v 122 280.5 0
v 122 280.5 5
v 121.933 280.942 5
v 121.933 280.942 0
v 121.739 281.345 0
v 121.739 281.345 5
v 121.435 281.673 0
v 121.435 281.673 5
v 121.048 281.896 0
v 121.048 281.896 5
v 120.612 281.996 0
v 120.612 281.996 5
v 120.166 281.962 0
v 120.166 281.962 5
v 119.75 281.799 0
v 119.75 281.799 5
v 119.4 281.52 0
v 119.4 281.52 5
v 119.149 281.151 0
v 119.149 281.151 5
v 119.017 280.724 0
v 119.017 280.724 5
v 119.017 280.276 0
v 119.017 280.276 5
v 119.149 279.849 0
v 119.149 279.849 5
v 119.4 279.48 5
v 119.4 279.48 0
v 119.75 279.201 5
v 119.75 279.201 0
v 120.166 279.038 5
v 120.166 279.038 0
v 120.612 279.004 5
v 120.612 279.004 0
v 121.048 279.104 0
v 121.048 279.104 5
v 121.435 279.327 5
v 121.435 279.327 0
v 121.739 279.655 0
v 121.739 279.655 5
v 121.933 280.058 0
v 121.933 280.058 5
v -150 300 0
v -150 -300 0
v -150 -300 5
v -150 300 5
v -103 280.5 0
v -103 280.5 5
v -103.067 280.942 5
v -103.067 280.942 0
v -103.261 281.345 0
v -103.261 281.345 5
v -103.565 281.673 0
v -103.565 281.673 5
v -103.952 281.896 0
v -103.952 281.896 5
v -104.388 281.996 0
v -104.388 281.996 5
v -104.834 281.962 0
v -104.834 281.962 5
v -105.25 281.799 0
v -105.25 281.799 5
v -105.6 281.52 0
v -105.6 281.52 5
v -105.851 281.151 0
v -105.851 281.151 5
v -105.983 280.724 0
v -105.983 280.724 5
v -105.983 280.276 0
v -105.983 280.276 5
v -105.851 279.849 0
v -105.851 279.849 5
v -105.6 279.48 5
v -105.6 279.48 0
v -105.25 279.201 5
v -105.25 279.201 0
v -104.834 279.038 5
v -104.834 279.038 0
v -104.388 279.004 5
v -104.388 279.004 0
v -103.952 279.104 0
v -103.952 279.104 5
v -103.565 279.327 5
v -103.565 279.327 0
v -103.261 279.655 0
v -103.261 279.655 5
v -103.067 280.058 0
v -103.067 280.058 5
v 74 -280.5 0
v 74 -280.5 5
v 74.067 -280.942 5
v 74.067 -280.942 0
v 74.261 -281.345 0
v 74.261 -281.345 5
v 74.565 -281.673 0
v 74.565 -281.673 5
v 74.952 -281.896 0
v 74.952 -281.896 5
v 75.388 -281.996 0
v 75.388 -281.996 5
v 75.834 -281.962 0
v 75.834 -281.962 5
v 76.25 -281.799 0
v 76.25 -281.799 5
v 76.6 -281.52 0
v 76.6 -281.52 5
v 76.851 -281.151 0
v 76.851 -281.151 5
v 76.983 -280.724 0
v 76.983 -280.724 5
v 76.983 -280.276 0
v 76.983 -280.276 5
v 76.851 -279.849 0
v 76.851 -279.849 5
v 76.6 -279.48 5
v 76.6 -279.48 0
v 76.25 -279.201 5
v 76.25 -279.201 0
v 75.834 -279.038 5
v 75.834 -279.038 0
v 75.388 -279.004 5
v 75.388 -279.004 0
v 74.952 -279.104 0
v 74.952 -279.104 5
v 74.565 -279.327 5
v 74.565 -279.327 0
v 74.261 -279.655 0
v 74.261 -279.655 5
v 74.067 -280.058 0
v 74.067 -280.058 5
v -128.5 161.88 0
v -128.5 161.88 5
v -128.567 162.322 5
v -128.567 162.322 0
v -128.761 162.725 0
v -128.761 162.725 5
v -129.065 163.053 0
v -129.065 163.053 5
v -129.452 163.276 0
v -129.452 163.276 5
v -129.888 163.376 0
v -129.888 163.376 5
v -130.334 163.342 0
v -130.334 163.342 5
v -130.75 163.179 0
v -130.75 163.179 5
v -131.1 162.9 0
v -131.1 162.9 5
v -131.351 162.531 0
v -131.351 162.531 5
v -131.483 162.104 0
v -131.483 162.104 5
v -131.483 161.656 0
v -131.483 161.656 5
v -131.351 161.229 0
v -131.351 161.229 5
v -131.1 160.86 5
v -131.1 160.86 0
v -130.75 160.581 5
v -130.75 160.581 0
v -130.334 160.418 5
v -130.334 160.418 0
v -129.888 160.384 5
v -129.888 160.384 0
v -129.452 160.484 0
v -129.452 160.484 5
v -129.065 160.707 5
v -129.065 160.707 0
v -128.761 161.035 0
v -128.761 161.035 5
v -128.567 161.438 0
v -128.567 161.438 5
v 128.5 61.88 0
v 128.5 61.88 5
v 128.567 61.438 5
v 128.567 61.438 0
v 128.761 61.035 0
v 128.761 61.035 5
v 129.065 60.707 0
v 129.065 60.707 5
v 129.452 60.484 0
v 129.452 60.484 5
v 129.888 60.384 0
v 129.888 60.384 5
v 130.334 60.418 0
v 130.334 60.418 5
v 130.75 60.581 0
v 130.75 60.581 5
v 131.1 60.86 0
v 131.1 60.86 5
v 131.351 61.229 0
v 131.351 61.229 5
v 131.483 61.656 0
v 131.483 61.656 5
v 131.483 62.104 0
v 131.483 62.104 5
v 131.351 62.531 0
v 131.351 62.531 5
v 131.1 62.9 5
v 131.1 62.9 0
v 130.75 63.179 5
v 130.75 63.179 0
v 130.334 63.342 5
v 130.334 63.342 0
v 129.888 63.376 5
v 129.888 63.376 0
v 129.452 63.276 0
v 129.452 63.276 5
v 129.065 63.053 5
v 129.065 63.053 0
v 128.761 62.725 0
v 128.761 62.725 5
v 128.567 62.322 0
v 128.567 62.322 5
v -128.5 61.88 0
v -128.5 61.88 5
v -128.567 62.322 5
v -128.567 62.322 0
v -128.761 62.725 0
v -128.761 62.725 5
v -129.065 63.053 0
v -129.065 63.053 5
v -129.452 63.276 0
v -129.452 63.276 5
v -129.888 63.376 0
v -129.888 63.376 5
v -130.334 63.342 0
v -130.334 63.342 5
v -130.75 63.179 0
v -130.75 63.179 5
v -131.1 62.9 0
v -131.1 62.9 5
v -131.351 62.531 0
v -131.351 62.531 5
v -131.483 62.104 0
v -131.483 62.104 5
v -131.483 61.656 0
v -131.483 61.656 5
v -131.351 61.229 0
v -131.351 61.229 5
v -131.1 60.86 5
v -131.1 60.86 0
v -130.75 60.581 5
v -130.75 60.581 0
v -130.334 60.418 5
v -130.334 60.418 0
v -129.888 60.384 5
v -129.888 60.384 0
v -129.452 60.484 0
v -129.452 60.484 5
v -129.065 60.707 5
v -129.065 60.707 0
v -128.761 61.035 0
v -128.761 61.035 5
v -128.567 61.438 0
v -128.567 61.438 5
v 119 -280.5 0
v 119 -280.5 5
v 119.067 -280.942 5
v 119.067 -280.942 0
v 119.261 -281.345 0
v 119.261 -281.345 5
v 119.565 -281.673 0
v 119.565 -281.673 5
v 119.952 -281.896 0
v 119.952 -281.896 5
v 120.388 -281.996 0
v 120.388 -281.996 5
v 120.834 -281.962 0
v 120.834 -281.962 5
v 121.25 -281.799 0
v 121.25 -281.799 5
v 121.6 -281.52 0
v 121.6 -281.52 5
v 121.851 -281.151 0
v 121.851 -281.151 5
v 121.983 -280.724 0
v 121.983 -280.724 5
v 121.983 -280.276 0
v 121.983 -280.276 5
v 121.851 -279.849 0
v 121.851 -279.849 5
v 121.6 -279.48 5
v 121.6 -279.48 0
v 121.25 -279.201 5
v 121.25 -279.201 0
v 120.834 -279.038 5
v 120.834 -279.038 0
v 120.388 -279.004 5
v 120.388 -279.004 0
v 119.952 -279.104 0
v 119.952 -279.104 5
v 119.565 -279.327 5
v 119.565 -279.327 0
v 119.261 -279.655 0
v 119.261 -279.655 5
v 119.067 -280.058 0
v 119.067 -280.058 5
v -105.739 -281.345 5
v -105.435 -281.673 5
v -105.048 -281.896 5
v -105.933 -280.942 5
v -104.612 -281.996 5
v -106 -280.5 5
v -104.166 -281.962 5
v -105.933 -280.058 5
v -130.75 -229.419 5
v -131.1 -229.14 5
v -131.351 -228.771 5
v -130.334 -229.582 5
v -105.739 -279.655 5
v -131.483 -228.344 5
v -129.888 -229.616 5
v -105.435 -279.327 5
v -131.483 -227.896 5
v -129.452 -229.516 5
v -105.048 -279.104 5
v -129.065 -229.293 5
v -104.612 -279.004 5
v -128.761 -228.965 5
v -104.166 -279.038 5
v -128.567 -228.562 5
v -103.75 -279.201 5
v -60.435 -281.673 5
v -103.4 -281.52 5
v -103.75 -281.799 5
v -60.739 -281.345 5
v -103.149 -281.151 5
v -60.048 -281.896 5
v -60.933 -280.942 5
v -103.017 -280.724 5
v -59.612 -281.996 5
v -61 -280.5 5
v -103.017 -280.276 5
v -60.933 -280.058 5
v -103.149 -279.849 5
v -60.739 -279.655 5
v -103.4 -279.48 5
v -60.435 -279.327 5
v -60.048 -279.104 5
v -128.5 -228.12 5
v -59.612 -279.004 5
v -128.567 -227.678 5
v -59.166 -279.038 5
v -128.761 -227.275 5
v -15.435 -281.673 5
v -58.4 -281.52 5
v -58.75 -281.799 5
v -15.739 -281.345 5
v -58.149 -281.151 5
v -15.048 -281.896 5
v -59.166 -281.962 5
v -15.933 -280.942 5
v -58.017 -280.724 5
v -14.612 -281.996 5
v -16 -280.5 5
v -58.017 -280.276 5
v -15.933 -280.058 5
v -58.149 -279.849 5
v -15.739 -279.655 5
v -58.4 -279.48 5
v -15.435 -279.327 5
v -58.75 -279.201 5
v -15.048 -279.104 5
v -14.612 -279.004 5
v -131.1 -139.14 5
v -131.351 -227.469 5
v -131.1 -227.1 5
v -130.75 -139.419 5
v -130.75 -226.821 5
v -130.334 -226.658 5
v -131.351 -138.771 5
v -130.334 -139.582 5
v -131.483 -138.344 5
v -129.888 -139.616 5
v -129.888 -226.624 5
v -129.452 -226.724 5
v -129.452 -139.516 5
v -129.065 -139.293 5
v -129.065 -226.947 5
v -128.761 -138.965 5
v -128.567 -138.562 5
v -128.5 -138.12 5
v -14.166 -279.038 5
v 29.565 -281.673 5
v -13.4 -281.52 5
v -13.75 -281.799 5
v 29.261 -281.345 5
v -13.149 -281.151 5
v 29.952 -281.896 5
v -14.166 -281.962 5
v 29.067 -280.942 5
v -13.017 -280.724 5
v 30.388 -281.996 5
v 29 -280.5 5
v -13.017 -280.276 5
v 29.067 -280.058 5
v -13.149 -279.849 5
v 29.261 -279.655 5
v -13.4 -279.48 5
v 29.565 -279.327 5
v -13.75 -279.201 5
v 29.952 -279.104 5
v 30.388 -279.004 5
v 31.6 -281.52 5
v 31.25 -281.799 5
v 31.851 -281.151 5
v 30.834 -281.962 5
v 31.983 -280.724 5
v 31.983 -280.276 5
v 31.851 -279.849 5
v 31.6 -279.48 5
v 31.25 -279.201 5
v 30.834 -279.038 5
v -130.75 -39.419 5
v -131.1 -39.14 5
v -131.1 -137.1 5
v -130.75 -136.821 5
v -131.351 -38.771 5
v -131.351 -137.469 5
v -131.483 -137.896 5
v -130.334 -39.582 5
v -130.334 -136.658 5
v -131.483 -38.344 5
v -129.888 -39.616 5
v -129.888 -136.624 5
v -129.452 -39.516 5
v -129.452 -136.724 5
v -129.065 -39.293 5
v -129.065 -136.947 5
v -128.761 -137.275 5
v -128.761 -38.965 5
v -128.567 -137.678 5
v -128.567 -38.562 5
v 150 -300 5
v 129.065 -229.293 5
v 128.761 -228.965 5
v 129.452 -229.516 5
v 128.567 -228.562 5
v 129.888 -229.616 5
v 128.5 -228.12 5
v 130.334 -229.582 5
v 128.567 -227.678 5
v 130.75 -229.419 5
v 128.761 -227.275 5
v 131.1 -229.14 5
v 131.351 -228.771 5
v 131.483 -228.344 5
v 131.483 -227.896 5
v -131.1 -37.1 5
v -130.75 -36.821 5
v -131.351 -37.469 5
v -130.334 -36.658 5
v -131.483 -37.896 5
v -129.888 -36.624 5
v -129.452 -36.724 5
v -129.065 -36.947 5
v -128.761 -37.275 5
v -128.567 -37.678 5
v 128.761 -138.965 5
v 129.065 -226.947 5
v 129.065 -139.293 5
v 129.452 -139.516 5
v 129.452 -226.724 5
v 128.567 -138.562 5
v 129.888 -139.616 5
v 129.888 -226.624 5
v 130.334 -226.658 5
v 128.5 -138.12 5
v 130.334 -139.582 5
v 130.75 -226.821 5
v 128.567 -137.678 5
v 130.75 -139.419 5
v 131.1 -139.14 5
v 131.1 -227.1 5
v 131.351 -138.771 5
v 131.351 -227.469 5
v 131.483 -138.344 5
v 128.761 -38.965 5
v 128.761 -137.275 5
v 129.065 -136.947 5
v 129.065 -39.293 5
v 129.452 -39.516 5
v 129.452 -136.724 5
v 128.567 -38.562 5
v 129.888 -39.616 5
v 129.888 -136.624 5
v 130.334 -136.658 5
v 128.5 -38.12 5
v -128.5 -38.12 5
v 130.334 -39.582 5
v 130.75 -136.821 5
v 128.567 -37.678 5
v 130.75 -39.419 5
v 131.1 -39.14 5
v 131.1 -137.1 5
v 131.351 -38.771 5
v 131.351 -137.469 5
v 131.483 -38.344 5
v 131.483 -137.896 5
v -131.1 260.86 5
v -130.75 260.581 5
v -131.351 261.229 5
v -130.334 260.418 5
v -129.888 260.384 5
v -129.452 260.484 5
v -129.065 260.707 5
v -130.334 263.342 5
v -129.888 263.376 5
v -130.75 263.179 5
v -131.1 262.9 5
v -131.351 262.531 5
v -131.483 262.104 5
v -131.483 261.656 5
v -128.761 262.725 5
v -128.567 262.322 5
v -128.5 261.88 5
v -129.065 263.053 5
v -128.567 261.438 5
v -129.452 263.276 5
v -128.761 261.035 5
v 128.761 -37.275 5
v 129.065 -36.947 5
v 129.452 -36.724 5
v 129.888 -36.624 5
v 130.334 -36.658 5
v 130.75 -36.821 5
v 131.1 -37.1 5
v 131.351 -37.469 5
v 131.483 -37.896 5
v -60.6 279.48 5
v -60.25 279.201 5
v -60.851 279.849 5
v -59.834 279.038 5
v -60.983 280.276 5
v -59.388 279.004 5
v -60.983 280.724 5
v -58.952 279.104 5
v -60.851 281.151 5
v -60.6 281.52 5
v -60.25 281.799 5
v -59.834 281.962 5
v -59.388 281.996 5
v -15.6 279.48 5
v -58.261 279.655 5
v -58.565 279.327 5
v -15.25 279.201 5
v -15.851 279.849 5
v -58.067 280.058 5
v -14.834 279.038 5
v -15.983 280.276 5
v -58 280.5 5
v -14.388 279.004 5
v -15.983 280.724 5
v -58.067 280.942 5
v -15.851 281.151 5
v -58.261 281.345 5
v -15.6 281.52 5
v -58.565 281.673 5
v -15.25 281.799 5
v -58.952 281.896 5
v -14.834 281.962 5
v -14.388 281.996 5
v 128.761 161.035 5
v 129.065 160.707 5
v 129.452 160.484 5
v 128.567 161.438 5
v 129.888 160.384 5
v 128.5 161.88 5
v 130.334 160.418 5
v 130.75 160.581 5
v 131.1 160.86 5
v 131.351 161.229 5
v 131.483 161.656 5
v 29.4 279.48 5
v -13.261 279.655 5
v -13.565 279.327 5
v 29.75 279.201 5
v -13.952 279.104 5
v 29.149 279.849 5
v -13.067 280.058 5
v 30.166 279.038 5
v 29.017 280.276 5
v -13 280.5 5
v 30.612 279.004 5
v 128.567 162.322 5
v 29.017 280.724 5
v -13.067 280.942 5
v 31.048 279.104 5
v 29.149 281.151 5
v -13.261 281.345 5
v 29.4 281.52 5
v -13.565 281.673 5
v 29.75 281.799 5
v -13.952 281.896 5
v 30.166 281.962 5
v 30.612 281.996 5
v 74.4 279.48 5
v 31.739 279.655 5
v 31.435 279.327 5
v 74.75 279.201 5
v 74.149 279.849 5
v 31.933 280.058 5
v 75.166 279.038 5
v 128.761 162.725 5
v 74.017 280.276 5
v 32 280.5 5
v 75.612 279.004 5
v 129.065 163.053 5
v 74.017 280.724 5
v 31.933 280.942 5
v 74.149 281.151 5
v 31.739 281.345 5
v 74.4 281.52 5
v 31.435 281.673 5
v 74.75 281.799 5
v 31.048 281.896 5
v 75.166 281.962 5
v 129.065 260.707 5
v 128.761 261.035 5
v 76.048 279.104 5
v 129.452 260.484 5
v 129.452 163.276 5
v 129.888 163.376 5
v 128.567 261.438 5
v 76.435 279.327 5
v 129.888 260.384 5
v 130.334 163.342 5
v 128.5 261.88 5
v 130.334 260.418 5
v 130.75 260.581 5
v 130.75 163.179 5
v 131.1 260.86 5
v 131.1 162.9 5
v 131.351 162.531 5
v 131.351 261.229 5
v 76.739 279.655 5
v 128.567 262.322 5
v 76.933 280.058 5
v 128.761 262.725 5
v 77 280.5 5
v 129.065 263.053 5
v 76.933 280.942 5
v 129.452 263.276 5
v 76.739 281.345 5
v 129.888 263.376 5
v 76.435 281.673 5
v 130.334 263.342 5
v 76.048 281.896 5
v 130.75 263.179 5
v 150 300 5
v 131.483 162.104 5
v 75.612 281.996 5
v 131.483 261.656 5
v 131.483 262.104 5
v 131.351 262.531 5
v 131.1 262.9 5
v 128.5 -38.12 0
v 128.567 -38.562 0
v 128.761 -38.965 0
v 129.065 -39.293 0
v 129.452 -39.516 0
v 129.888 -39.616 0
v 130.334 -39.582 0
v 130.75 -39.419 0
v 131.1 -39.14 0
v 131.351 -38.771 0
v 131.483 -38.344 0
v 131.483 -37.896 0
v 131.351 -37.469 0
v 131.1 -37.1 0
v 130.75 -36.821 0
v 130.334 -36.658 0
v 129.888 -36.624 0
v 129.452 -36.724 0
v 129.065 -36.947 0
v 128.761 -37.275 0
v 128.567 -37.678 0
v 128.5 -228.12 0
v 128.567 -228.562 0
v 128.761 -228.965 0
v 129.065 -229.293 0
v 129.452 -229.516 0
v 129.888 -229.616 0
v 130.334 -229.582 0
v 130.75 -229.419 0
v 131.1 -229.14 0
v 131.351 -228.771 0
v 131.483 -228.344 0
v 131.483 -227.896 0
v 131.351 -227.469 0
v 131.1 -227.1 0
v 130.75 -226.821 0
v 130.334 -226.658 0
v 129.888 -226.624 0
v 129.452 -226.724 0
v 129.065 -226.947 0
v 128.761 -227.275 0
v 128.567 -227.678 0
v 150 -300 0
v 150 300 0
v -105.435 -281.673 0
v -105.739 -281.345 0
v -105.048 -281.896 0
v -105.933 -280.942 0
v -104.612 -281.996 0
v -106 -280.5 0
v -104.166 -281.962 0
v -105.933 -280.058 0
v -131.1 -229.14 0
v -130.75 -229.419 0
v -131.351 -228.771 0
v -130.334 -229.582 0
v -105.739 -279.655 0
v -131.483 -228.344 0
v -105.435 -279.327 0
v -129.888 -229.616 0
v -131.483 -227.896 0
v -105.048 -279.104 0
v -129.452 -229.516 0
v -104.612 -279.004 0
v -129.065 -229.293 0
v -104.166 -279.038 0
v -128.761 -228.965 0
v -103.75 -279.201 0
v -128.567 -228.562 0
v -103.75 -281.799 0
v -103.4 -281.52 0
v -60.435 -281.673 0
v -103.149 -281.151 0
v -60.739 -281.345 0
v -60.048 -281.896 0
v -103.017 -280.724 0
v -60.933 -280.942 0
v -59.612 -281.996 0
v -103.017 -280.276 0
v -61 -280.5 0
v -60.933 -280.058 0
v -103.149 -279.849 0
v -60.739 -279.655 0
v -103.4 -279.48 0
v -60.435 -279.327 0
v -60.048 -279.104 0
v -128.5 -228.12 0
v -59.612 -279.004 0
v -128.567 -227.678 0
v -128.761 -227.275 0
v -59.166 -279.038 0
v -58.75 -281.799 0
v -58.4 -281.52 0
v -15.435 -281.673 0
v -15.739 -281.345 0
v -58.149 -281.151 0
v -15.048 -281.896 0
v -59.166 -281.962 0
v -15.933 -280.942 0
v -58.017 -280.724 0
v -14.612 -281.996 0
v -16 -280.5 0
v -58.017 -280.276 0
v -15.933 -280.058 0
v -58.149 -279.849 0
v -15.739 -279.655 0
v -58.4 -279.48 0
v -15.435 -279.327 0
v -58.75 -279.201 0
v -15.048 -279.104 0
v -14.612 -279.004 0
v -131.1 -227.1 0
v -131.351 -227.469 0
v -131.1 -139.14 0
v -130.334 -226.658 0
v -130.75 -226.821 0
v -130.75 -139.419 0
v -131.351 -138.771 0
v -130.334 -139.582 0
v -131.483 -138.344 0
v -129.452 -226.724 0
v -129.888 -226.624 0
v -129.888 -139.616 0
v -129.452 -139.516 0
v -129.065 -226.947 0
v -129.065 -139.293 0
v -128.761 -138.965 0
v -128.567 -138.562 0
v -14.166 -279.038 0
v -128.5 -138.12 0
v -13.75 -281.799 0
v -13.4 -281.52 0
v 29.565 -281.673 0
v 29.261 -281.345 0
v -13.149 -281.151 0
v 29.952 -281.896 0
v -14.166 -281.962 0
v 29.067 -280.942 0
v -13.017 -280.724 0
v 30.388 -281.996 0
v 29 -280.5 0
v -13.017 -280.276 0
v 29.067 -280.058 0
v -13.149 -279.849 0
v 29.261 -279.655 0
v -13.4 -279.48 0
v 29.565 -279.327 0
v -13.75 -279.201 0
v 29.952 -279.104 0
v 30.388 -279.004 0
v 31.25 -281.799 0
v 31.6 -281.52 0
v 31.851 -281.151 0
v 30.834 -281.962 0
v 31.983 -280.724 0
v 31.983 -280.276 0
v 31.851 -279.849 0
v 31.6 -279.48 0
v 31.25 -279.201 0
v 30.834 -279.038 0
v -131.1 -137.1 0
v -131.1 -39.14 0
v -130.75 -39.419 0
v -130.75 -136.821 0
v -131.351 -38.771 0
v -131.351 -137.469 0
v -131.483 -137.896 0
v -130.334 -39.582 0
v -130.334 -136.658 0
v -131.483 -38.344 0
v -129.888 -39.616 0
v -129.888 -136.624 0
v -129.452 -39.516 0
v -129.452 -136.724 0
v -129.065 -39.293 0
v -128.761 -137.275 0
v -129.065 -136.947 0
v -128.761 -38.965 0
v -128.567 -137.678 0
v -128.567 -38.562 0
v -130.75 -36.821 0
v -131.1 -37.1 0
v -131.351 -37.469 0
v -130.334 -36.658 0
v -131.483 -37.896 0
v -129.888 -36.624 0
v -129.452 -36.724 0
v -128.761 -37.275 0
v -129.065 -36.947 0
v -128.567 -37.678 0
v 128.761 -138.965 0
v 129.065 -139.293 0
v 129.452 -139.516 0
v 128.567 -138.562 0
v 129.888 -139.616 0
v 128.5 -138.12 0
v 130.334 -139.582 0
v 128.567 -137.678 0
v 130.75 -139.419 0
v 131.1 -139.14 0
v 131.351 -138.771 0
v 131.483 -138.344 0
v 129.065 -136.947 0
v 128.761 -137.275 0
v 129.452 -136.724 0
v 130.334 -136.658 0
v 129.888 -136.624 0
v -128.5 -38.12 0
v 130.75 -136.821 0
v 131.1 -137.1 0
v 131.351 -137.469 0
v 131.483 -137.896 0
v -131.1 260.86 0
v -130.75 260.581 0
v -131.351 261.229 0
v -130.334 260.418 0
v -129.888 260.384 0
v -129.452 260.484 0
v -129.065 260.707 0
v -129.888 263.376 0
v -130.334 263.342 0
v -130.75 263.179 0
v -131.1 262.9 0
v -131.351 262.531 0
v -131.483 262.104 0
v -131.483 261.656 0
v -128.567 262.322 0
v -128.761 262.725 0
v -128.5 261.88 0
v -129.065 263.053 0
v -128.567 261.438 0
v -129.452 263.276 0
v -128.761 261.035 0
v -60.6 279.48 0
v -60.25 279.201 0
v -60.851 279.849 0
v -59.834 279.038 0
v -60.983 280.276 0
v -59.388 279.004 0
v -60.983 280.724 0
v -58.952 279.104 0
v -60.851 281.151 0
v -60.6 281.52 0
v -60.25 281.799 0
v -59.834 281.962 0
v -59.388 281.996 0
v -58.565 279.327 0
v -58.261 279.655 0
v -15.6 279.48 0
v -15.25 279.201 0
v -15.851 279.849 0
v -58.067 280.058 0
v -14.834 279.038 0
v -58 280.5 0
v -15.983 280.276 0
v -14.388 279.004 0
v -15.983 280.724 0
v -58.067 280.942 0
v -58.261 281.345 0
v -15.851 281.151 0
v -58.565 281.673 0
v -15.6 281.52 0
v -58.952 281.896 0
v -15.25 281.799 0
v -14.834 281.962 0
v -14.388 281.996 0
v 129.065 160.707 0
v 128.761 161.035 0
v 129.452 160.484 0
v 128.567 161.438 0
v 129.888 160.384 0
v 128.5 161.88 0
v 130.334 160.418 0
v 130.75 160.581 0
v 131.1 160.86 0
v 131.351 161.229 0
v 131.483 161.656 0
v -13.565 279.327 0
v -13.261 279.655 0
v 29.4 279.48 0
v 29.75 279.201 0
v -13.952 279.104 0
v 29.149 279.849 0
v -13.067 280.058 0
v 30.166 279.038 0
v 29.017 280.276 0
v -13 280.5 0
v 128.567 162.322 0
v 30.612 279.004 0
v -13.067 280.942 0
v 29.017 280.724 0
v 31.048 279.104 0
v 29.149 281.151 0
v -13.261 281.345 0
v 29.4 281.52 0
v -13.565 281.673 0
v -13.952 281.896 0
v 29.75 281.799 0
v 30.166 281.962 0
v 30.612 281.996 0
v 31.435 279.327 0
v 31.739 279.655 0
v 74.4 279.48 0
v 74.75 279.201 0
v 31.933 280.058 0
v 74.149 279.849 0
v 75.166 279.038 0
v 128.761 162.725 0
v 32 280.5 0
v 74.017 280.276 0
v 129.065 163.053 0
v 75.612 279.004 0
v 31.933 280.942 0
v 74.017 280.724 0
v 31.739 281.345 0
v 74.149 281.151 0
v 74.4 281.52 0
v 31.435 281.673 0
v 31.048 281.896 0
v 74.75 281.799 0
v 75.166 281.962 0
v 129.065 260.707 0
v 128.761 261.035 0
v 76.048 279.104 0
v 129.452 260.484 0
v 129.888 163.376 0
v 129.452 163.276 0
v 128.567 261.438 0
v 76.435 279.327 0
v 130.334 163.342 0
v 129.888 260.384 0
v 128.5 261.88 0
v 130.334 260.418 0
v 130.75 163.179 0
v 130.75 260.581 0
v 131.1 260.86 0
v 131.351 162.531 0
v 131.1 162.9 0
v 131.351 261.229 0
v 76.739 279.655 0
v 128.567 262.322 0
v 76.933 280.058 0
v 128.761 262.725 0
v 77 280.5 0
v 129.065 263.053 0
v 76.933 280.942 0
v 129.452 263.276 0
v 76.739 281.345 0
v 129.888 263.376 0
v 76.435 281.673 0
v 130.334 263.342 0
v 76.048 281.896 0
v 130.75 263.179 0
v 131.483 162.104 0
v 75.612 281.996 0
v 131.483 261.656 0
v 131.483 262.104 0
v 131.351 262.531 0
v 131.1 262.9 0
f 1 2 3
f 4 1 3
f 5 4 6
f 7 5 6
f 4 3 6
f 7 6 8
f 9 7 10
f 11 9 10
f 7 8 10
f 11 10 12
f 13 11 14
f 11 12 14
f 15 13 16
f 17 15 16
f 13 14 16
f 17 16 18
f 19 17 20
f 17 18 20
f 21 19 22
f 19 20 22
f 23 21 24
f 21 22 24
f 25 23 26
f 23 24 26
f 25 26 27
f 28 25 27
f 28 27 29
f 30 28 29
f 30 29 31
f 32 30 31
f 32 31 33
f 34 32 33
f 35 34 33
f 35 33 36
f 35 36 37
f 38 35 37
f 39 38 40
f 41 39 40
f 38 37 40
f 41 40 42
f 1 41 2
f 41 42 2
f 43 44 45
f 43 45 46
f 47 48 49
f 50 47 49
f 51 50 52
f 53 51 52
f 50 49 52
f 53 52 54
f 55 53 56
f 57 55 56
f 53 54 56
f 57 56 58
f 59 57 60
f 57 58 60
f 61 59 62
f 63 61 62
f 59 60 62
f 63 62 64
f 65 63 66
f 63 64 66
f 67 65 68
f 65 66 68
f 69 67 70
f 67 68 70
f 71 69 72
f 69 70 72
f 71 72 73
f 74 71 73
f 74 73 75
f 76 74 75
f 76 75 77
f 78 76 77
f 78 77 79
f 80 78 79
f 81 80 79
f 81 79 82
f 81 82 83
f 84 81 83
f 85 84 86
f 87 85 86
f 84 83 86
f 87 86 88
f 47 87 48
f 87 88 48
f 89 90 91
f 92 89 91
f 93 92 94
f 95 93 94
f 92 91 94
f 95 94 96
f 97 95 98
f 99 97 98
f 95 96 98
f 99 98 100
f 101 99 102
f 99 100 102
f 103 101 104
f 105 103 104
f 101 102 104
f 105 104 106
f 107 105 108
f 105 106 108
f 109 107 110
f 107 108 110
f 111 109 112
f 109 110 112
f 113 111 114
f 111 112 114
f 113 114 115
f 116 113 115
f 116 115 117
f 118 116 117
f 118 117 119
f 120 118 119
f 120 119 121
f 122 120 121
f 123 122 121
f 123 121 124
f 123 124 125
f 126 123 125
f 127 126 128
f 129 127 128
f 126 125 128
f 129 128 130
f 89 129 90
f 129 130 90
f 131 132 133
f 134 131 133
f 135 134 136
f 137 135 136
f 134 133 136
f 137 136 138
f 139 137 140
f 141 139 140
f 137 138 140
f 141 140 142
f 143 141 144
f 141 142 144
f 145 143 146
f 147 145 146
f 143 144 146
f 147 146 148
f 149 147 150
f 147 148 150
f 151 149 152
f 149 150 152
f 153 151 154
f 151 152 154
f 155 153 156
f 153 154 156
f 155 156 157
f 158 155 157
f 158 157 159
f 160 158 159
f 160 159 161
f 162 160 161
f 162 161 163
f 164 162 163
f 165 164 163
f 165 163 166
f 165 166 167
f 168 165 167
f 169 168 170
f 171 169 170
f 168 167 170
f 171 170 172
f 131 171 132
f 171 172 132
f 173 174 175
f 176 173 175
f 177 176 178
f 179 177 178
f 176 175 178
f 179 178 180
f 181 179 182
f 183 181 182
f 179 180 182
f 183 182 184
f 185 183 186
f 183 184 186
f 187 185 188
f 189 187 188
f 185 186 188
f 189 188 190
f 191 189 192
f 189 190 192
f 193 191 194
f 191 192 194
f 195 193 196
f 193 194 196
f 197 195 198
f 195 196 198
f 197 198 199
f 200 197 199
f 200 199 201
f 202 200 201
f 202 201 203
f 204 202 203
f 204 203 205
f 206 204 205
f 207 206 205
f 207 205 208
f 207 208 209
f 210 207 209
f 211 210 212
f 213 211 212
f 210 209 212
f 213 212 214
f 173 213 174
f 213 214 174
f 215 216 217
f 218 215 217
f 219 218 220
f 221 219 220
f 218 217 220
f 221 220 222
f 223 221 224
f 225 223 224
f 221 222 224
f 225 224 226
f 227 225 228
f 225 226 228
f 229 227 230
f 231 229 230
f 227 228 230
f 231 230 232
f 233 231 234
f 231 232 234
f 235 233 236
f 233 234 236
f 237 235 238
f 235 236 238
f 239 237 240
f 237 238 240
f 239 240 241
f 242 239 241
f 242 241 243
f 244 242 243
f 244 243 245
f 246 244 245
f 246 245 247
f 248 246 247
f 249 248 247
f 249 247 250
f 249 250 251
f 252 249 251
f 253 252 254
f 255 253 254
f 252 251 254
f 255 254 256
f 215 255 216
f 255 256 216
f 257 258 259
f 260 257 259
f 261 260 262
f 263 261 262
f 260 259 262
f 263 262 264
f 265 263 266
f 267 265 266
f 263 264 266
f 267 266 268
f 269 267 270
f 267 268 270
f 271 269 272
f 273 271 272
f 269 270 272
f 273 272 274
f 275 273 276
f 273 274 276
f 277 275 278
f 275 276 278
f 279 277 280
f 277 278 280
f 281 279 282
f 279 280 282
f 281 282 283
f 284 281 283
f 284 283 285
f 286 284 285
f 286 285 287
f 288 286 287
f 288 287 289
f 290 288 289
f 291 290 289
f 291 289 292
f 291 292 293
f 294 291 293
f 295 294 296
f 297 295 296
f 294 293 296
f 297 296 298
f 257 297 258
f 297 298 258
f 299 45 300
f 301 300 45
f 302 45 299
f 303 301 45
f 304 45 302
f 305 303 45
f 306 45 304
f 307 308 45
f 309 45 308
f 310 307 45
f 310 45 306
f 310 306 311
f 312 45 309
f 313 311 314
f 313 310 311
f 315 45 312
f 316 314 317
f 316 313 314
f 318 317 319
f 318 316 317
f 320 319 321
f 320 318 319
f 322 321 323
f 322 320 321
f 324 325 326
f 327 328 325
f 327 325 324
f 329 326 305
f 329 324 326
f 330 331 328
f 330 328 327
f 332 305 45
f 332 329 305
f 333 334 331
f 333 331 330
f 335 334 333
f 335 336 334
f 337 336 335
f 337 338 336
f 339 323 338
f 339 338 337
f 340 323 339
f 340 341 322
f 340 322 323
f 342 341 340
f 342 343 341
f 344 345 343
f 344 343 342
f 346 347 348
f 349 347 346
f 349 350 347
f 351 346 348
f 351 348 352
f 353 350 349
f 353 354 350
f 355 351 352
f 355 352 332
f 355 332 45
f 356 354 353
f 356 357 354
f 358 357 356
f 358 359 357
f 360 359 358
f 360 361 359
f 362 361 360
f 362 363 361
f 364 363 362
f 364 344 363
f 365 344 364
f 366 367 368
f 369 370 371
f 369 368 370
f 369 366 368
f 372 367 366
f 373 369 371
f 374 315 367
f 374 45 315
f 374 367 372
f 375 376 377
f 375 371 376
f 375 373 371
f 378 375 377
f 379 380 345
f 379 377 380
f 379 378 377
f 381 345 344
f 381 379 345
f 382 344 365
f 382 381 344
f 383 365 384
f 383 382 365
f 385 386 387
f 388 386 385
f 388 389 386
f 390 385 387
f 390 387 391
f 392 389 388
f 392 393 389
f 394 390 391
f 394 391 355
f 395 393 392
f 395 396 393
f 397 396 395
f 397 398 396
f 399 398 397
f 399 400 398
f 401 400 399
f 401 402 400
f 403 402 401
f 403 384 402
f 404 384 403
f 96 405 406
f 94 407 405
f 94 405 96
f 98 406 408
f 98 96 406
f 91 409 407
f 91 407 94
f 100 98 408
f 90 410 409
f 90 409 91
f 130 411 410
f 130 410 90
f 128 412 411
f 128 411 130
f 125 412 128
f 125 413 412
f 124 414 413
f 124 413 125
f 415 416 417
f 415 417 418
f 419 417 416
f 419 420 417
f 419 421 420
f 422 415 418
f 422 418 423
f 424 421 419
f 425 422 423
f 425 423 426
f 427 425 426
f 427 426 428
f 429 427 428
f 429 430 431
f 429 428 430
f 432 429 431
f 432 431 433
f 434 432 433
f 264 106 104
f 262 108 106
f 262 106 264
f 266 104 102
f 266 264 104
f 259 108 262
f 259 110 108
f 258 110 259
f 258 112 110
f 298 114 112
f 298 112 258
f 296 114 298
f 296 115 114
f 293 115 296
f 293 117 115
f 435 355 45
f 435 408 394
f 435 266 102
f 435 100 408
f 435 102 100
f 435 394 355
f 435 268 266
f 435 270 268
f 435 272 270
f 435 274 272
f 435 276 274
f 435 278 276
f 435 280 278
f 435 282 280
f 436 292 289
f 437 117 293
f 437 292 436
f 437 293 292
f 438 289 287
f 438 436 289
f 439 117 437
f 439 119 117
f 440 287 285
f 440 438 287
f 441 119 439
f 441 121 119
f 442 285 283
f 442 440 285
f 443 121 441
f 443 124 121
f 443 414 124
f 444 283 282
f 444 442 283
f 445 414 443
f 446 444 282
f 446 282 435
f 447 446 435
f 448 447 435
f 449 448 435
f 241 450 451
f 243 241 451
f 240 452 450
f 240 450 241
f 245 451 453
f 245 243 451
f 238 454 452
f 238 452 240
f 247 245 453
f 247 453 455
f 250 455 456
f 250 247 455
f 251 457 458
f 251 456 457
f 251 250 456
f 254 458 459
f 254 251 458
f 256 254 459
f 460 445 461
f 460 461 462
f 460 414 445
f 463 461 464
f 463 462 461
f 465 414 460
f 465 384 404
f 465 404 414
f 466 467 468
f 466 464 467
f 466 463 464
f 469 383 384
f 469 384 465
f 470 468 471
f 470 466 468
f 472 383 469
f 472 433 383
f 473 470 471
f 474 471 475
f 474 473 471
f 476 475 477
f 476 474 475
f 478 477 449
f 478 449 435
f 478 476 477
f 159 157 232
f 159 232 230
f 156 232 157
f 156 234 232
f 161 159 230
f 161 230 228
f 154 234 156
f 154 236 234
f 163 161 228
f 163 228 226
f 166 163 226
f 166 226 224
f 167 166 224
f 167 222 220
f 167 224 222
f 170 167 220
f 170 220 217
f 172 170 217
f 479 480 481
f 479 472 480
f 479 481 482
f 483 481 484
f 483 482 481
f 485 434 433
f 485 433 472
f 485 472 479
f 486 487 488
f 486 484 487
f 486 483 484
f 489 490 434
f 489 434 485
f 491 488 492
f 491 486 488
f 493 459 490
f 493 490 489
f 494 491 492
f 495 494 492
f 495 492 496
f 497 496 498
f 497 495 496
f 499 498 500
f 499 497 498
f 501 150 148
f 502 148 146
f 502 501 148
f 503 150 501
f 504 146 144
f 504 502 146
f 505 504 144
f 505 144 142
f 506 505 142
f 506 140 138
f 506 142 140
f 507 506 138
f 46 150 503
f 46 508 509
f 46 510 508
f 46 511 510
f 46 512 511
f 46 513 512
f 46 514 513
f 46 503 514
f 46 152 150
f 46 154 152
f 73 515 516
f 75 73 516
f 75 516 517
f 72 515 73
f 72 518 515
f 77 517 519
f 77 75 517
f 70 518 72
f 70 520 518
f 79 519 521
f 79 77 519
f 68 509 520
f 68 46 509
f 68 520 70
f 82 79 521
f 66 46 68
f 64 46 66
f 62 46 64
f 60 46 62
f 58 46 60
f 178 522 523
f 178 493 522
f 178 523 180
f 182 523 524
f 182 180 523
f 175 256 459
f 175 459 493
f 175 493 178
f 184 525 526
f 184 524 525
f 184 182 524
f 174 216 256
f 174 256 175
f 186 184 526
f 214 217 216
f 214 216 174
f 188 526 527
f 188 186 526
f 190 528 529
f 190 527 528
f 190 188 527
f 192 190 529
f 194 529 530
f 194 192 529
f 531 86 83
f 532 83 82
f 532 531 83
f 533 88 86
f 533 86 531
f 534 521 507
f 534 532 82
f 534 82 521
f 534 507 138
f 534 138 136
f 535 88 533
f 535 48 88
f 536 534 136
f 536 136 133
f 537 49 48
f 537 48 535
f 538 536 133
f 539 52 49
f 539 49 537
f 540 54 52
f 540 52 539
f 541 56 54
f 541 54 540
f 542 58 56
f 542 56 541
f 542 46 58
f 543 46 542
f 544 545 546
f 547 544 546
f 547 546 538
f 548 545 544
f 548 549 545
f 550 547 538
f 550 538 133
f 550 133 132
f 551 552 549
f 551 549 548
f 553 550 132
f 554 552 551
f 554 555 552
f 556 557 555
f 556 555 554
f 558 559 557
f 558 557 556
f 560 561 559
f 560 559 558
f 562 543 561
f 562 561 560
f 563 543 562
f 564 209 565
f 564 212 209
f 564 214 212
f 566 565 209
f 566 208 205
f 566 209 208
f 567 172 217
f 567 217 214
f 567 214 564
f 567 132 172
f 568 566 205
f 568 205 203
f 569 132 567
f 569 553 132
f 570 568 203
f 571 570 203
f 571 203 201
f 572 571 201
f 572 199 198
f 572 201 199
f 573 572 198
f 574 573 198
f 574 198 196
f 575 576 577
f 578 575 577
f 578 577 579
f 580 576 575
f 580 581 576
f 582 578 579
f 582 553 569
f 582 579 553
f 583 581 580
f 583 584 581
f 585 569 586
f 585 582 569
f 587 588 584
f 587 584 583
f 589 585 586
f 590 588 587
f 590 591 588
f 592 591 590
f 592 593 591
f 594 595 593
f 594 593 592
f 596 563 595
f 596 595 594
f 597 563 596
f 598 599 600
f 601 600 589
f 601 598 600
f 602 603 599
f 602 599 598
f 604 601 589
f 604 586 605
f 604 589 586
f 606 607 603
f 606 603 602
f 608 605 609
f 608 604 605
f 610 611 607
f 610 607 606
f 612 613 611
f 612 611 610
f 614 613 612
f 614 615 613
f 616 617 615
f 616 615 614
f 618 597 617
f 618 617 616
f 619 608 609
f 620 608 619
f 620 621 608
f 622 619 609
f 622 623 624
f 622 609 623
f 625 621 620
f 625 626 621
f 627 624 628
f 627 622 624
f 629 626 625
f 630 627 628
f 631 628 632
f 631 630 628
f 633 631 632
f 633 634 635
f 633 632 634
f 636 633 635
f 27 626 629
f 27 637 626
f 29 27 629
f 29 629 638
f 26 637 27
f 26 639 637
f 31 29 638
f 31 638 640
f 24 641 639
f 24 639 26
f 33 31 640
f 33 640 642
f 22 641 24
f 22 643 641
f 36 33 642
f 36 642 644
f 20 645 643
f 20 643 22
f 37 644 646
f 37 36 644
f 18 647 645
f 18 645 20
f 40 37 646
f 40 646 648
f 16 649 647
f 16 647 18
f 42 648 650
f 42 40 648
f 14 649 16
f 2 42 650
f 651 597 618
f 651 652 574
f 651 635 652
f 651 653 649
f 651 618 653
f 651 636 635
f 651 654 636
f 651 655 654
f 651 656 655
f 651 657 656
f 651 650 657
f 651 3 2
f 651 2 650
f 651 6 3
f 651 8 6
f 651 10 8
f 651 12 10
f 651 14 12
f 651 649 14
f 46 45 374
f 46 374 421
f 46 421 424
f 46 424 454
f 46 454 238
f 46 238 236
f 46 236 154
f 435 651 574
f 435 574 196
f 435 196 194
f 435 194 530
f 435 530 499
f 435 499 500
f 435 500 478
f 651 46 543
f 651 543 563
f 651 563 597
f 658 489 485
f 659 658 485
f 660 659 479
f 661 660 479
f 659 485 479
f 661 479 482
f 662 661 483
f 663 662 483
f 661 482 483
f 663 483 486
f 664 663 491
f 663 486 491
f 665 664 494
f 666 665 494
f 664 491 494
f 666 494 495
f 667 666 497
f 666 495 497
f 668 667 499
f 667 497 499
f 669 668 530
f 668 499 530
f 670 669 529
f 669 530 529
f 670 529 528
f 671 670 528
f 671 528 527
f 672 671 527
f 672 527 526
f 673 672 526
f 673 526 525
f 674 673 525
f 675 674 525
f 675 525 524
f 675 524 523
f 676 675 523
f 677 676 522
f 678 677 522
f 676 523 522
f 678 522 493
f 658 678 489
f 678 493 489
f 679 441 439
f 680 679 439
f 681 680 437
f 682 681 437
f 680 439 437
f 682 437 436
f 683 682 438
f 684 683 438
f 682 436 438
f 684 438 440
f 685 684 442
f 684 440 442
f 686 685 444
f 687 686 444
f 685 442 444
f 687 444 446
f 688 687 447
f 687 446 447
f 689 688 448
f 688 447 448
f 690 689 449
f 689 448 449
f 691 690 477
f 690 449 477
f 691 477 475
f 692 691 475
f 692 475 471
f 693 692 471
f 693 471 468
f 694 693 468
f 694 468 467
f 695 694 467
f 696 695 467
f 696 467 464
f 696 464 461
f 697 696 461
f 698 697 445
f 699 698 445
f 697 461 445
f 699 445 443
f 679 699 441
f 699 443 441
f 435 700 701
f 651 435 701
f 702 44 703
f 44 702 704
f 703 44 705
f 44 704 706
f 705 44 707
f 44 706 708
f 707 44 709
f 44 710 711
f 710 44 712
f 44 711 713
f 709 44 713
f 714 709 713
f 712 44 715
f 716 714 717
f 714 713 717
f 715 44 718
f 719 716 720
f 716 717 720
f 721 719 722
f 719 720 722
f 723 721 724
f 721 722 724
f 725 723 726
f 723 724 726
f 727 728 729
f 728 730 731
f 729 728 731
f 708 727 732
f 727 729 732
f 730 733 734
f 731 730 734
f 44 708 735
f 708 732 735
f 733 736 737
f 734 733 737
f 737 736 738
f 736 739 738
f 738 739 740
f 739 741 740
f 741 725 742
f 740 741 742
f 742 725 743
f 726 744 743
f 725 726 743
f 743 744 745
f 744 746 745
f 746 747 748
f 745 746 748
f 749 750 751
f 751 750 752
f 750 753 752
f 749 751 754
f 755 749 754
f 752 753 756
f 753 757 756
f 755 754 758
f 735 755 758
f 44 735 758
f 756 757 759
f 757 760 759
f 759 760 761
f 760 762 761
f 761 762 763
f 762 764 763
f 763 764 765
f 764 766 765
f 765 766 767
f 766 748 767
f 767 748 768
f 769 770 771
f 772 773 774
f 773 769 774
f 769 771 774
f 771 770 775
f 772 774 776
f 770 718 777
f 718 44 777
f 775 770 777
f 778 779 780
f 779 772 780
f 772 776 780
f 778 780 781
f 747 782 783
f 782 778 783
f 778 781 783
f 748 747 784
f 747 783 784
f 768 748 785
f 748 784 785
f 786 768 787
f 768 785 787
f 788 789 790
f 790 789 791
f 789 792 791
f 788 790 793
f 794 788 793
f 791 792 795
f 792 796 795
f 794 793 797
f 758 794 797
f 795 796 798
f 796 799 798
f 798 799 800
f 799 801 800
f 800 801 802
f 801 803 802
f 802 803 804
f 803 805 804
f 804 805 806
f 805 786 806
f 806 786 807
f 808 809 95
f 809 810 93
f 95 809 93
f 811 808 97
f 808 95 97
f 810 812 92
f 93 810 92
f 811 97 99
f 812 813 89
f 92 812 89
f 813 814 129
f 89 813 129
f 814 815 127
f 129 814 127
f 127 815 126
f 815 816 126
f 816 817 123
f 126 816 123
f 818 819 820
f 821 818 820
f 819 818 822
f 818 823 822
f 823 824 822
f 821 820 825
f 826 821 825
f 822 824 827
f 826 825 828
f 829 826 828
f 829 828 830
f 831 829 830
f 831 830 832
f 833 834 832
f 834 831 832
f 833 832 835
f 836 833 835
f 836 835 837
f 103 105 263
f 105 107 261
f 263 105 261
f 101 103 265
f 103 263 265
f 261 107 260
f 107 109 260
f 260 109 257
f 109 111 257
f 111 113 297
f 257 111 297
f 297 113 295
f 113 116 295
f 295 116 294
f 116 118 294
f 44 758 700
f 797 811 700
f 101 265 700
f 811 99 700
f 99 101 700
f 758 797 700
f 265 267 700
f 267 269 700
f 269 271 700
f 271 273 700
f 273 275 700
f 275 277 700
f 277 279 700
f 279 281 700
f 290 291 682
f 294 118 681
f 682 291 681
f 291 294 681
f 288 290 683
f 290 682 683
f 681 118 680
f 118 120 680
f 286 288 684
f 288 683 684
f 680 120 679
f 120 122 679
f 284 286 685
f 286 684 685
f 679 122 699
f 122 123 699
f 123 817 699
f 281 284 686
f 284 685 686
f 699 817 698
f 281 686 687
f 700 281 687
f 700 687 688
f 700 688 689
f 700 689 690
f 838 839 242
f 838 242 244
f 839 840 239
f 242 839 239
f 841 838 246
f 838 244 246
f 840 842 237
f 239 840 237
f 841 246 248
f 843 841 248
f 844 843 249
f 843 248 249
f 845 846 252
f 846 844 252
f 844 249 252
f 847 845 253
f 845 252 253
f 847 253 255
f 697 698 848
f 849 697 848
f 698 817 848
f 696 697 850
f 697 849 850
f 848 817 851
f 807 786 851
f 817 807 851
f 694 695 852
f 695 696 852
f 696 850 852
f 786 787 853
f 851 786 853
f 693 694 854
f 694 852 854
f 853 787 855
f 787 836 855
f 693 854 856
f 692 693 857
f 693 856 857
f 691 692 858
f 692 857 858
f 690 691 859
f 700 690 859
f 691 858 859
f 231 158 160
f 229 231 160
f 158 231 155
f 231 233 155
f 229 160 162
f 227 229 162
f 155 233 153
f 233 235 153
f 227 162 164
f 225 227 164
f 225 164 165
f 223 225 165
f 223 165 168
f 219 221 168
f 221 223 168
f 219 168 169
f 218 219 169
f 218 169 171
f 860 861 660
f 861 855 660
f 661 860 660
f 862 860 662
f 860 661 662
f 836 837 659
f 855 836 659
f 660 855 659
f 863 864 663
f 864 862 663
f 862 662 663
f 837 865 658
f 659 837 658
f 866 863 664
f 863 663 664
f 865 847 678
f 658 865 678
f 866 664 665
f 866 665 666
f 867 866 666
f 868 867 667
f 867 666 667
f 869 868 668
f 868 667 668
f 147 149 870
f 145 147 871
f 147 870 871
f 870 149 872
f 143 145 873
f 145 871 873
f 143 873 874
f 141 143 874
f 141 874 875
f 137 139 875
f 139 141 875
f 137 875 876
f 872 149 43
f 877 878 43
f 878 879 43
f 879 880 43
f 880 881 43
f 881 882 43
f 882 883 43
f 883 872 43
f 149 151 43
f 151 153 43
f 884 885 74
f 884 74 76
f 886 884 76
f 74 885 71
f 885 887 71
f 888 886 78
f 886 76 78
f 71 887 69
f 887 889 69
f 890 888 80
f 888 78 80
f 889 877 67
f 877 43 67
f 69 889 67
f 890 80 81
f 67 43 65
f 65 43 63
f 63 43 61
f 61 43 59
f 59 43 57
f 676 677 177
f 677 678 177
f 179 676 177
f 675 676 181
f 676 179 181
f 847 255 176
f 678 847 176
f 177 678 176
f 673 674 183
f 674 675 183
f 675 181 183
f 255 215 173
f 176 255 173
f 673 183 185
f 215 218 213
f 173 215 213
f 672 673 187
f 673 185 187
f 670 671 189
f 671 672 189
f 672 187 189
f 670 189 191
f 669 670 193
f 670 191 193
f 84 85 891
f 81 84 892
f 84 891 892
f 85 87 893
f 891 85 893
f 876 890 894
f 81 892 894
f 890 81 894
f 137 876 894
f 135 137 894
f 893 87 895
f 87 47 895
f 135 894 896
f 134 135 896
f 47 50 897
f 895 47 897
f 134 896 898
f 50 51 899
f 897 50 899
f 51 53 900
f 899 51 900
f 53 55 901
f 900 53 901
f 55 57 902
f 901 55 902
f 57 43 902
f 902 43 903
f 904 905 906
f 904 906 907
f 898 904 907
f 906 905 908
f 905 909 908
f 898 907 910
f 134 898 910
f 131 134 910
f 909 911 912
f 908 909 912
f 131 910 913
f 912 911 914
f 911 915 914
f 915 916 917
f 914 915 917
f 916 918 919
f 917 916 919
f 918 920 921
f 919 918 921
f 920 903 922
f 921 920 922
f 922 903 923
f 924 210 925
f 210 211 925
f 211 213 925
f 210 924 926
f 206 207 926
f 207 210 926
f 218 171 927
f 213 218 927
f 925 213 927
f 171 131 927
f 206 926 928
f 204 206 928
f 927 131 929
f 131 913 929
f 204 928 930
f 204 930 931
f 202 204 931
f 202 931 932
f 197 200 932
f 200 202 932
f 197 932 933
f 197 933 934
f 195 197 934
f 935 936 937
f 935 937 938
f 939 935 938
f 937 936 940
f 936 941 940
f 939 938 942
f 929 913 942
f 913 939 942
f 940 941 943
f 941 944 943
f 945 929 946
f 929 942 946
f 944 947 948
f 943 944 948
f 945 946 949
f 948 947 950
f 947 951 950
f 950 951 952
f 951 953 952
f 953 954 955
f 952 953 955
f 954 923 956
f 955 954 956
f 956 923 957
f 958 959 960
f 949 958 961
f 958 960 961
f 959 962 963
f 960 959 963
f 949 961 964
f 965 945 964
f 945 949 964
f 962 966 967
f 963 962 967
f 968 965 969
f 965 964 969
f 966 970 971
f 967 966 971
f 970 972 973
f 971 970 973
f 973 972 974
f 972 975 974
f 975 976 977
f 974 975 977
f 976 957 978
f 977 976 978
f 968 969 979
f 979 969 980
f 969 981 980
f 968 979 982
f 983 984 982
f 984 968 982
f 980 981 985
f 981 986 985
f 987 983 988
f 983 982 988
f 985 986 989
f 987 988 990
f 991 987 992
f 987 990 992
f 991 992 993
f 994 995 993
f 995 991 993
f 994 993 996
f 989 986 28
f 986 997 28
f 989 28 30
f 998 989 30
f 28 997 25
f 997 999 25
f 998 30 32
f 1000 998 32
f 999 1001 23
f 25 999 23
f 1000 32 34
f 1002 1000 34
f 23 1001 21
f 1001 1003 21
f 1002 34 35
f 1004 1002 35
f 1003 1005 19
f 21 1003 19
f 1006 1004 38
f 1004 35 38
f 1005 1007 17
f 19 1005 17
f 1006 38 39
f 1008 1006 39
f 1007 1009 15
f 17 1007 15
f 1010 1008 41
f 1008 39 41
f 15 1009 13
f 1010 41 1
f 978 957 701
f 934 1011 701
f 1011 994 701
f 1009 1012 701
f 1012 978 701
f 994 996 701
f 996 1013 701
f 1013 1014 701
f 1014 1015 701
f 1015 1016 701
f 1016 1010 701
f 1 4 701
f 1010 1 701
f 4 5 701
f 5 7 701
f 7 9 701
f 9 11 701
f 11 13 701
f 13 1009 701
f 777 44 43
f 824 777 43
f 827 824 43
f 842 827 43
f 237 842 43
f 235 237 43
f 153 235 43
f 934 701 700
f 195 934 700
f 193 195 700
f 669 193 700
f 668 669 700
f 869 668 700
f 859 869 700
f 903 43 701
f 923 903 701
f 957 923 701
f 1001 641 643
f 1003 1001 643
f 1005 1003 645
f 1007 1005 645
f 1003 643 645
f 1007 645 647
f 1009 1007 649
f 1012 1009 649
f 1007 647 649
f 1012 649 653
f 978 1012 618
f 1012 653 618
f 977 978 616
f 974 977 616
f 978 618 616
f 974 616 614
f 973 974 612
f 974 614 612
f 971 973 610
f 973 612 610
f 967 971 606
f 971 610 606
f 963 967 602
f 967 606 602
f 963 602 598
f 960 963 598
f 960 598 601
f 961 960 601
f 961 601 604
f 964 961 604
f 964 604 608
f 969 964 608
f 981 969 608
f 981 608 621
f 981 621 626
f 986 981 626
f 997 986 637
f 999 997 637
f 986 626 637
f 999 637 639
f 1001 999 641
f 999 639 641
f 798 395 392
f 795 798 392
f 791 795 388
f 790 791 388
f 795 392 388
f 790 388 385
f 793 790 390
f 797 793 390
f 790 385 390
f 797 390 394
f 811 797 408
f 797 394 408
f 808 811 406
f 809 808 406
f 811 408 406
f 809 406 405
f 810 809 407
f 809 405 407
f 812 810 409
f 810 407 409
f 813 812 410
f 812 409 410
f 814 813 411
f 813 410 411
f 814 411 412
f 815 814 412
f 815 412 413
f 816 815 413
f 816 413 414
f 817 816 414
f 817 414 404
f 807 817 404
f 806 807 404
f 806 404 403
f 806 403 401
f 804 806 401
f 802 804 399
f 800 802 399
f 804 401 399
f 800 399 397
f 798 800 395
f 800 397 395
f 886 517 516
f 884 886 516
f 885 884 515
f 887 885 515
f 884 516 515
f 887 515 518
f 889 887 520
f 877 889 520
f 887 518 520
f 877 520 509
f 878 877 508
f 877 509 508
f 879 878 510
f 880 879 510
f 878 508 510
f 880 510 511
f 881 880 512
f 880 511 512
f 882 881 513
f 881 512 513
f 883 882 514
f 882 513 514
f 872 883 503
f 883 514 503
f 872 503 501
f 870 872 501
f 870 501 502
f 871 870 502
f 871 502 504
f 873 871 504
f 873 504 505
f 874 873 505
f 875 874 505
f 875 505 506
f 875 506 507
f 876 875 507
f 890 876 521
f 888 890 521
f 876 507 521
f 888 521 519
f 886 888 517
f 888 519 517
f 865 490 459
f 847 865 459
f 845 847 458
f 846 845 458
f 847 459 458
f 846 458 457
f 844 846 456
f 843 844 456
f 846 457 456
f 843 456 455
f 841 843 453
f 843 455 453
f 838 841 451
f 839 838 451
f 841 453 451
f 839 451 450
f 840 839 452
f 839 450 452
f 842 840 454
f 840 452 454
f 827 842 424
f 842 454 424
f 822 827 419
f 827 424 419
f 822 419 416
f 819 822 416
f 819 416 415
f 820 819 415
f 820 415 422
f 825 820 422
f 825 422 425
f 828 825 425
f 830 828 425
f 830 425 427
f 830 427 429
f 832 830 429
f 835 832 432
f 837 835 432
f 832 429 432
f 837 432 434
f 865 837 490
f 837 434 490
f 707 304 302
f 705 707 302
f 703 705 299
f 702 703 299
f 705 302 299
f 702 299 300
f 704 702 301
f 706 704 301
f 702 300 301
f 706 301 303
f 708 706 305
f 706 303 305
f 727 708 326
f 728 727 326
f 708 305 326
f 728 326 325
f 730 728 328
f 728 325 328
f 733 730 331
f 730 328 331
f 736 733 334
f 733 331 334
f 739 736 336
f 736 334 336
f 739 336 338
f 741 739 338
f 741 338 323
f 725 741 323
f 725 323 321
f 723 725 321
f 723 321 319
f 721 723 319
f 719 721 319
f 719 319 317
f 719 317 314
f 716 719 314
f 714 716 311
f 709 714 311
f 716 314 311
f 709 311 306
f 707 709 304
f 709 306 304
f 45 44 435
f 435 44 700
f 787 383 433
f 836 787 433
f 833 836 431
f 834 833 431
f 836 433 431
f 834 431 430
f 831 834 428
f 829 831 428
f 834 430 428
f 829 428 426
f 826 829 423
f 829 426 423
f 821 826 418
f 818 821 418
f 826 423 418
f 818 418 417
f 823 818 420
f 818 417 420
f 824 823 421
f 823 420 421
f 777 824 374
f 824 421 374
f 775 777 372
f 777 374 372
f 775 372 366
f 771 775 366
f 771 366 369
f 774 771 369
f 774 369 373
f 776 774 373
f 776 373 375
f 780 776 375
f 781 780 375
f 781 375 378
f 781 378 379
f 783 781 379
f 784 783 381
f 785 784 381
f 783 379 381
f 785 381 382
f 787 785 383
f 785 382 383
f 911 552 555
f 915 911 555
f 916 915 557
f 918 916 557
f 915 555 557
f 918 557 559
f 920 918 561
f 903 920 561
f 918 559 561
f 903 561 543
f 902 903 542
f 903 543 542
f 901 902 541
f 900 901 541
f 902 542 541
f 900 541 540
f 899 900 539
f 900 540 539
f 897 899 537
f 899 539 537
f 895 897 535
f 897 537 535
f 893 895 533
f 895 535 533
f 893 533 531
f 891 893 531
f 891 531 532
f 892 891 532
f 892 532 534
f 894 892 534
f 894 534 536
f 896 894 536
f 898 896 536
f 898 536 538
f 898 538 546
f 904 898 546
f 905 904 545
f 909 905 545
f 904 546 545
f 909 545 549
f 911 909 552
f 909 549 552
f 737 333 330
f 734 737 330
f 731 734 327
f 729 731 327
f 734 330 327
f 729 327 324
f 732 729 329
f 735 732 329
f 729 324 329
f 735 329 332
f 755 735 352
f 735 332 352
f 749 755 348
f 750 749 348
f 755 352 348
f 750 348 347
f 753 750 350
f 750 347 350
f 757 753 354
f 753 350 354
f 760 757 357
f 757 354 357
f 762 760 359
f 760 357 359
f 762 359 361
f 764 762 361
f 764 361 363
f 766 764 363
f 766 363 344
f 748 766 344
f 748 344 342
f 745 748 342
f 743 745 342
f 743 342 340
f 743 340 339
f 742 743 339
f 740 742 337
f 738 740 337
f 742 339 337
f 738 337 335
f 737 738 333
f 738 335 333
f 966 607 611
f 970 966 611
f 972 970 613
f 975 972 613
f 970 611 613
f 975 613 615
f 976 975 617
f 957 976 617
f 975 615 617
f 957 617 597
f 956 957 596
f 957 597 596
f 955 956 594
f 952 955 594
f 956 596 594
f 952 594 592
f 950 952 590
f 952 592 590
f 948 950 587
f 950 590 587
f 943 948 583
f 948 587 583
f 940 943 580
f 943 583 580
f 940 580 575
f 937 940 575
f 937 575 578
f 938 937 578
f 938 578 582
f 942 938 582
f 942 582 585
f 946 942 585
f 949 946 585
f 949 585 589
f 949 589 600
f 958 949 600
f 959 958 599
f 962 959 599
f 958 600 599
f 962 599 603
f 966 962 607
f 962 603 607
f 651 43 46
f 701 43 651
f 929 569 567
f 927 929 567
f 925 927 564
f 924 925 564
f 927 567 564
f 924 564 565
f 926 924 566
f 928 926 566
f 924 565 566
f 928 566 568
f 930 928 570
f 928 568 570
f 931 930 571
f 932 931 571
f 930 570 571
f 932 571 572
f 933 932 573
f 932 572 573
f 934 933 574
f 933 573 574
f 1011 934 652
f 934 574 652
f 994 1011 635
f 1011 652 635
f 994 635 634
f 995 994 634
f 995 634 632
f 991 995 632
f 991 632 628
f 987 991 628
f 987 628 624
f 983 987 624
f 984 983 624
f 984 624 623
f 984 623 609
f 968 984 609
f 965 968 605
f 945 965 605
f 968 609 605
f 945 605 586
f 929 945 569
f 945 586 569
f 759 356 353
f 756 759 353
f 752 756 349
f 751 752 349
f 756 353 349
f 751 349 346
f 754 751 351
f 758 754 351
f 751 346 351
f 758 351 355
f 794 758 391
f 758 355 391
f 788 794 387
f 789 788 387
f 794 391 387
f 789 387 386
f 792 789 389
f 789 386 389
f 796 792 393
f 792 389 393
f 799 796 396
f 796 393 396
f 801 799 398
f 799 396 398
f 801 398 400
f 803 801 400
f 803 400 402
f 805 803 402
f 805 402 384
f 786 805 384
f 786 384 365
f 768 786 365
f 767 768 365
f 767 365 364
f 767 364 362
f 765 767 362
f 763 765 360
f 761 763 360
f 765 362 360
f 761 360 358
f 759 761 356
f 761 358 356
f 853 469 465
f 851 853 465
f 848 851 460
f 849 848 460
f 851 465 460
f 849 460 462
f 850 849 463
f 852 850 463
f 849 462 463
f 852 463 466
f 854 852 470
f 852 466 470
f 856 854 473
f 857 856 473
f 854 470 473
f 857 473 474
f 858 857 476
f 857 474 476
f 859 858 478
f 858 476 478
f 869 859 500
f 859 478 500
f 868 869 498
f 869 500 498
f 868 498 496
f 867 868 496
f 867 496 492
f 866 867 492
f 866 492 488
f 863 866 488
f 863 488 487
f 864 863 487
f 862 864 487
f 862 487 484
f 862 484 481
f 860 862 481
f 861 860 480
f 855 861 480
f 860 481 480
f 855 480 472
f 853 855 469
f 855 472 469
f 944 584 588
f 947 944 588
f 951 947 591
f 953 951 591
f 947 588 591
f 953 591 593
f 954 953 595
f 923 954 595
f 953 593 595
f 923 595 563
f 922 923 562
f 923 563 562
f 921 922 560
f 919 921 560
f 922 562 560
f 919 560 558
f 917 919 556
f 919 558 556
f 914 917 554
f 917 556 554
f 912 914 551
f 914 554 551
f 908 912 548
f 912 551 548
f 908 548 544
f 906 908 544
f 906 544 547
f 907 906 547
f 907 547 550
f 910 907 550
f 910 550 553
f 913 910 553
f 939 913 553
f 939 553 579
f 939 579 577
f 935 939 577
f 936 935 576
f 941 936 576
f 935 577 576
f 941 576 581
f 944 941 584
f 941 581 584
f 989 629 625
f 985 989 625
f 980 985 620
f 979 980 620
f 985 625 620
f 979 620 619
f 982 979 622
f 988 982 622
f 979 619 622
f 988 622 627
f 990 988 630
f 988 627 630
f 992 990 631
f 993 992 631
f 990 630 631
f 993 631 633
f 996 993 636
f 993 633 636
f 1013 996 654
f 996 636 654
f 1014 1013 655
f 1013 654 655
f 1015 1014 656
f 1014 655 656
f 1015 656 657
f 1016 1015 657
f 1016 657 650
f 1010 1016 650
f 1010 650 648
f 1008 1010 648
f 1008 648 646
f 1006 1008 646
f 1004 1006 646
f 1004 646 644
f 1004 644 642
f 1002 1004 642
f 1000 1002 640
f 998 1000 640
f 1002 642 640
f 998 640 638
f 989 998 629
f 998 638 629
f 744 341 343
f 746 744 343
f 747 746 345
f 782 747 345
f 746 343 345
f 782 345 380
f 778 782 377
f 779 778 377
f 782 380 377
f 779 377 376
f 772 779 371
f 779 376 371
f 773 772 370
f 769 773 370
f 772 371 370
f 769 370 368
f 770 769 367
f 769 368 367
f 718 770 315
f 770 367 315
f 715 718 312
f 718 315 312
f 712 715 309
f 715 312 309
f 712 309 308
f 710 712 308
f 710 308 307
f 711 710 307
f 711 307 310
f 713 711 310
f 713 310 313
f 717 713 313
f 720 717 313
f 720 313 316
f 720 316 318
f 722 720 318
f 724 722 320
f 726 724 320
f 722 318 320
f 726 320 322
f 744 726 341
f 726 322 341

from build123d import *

# Parameters (mm, degrees)
CROQUIS1_W              = 300
CROQUIS1_H              = 600
SALIENTE_EXTRUIR1_DEPTH = 5
CROQUIS2_R              = 1.5
CORTAR_EXTRUIR1_DEPTH   = 5
CROQUIS3_R              = 1.5
CORTAR_EXTRUIR2_DEPTH   = 5


with BuildPart() as part:
    # Croquis1 → Saliente-Extruir1 (new body)
    with BuildSketch(Plane.XY):
        Rectangle(CROQUIS1_W, CROQUIS1_H)
    extrude(amount=SALIENTE_EXTRUIR1_DEPTH)

    # Croquis2 → Cortar-Extruir1 (cut)
    with BuildSketch(Plane.XY.offset(5)):
        with Locations((-104.5, 280.5)):
            Circle(CROQUIS2_R)
        with Locations((-59.5, 280.5)):
            Circle(CROQUIS2_R)
        with Locations((-14.5, 280.5)):
            Circle(CROQUIS2_R)
        with Locations((30.5, 280.5)):
            Circle(CROQUIS2_R)
        with Locations((75.5, 280.5)):
            Circle(CROQUIS2_R)
        with Locations((120.5, 280.5)):
            Circle(CROQUIS2_R)
        with Locations(Location((120.5, -280.5, 0), (0, 0, 180))):
            Circle(CROQUIS2_R)
        with Locations(Location((75.5, -280.5, 0), (0, 0, 180))):
            Circle(CROQUIS2_R)
        with Locations(Location((30.5, -280.5, 0), (0, 0, 180))):
            Circle(CROQUIS2_R)
        with Locations(Location((-14.5, -280.5, 0), (0, 0, 180))):
            Circle(CROQUIS2_R)
        with Locations(Location((-59.5, -280.5, 0), (0, 0, 180))):
            Circle(CROQUIS2_R)
        with Locations(Location((-104.5, -280.5, 0), (0, 0, 180))):
            Circle(CROQUIS2_R)
    extrude(amount=-CORTAR_EXTRUIR1_DEPTH, mode=Mode.SUBTRACT)

    # Croquis3 → Cortar-Extruir2 (cut)
    with BuildSketch(Plane.XY.offset(5)):
        with Locations((-130, 261.88)):
            Circle(CROQUIS3_R)
        with Locations((-130, 161.88)):
            Circle(CROQUIS3_R)
        with Locations((-130, 61.88)):
            Circle(CROQUIS3_R)
        with Locations((-130, -38.12)):
            Circle(CROQUIS3_R)
        with Locations((-130, -138.12)):
            Circle(CROQUIS3_R)
        with Locations((-130, -228.12)):
            Circle(CROQUIS3_R)
        with Locations(Location((130, -228.12, 0), (0, 0, 180))):
            Circle(CROQUIS3_R)
        with Locations(Location((130, -138.12, 0), (0, 0, 180))):
            Circle(CROQUIS3_R)
        with Locations(Location((130, -38.12, 0), (0, 0, 180))):
            Circle(CROQUIS3_R)
        with Locations(Location((130, 61.88, 0), (0, 0, 180))):
            Circle(CROQUIS3_R)
        with Locations(Location((130, 161.88, 0), (0, 0, 180))):
            Circle(CROQUIS3_R)
        with Locations(Location((130, 261.88, 0), (0, 0, 180))):
            Circle(CROQUIS3_R)
    extrude(amount=-CORTAR_EXTRUIR2_DEPTH, mode=Mode.SUBTRACT)


solid = part.part
